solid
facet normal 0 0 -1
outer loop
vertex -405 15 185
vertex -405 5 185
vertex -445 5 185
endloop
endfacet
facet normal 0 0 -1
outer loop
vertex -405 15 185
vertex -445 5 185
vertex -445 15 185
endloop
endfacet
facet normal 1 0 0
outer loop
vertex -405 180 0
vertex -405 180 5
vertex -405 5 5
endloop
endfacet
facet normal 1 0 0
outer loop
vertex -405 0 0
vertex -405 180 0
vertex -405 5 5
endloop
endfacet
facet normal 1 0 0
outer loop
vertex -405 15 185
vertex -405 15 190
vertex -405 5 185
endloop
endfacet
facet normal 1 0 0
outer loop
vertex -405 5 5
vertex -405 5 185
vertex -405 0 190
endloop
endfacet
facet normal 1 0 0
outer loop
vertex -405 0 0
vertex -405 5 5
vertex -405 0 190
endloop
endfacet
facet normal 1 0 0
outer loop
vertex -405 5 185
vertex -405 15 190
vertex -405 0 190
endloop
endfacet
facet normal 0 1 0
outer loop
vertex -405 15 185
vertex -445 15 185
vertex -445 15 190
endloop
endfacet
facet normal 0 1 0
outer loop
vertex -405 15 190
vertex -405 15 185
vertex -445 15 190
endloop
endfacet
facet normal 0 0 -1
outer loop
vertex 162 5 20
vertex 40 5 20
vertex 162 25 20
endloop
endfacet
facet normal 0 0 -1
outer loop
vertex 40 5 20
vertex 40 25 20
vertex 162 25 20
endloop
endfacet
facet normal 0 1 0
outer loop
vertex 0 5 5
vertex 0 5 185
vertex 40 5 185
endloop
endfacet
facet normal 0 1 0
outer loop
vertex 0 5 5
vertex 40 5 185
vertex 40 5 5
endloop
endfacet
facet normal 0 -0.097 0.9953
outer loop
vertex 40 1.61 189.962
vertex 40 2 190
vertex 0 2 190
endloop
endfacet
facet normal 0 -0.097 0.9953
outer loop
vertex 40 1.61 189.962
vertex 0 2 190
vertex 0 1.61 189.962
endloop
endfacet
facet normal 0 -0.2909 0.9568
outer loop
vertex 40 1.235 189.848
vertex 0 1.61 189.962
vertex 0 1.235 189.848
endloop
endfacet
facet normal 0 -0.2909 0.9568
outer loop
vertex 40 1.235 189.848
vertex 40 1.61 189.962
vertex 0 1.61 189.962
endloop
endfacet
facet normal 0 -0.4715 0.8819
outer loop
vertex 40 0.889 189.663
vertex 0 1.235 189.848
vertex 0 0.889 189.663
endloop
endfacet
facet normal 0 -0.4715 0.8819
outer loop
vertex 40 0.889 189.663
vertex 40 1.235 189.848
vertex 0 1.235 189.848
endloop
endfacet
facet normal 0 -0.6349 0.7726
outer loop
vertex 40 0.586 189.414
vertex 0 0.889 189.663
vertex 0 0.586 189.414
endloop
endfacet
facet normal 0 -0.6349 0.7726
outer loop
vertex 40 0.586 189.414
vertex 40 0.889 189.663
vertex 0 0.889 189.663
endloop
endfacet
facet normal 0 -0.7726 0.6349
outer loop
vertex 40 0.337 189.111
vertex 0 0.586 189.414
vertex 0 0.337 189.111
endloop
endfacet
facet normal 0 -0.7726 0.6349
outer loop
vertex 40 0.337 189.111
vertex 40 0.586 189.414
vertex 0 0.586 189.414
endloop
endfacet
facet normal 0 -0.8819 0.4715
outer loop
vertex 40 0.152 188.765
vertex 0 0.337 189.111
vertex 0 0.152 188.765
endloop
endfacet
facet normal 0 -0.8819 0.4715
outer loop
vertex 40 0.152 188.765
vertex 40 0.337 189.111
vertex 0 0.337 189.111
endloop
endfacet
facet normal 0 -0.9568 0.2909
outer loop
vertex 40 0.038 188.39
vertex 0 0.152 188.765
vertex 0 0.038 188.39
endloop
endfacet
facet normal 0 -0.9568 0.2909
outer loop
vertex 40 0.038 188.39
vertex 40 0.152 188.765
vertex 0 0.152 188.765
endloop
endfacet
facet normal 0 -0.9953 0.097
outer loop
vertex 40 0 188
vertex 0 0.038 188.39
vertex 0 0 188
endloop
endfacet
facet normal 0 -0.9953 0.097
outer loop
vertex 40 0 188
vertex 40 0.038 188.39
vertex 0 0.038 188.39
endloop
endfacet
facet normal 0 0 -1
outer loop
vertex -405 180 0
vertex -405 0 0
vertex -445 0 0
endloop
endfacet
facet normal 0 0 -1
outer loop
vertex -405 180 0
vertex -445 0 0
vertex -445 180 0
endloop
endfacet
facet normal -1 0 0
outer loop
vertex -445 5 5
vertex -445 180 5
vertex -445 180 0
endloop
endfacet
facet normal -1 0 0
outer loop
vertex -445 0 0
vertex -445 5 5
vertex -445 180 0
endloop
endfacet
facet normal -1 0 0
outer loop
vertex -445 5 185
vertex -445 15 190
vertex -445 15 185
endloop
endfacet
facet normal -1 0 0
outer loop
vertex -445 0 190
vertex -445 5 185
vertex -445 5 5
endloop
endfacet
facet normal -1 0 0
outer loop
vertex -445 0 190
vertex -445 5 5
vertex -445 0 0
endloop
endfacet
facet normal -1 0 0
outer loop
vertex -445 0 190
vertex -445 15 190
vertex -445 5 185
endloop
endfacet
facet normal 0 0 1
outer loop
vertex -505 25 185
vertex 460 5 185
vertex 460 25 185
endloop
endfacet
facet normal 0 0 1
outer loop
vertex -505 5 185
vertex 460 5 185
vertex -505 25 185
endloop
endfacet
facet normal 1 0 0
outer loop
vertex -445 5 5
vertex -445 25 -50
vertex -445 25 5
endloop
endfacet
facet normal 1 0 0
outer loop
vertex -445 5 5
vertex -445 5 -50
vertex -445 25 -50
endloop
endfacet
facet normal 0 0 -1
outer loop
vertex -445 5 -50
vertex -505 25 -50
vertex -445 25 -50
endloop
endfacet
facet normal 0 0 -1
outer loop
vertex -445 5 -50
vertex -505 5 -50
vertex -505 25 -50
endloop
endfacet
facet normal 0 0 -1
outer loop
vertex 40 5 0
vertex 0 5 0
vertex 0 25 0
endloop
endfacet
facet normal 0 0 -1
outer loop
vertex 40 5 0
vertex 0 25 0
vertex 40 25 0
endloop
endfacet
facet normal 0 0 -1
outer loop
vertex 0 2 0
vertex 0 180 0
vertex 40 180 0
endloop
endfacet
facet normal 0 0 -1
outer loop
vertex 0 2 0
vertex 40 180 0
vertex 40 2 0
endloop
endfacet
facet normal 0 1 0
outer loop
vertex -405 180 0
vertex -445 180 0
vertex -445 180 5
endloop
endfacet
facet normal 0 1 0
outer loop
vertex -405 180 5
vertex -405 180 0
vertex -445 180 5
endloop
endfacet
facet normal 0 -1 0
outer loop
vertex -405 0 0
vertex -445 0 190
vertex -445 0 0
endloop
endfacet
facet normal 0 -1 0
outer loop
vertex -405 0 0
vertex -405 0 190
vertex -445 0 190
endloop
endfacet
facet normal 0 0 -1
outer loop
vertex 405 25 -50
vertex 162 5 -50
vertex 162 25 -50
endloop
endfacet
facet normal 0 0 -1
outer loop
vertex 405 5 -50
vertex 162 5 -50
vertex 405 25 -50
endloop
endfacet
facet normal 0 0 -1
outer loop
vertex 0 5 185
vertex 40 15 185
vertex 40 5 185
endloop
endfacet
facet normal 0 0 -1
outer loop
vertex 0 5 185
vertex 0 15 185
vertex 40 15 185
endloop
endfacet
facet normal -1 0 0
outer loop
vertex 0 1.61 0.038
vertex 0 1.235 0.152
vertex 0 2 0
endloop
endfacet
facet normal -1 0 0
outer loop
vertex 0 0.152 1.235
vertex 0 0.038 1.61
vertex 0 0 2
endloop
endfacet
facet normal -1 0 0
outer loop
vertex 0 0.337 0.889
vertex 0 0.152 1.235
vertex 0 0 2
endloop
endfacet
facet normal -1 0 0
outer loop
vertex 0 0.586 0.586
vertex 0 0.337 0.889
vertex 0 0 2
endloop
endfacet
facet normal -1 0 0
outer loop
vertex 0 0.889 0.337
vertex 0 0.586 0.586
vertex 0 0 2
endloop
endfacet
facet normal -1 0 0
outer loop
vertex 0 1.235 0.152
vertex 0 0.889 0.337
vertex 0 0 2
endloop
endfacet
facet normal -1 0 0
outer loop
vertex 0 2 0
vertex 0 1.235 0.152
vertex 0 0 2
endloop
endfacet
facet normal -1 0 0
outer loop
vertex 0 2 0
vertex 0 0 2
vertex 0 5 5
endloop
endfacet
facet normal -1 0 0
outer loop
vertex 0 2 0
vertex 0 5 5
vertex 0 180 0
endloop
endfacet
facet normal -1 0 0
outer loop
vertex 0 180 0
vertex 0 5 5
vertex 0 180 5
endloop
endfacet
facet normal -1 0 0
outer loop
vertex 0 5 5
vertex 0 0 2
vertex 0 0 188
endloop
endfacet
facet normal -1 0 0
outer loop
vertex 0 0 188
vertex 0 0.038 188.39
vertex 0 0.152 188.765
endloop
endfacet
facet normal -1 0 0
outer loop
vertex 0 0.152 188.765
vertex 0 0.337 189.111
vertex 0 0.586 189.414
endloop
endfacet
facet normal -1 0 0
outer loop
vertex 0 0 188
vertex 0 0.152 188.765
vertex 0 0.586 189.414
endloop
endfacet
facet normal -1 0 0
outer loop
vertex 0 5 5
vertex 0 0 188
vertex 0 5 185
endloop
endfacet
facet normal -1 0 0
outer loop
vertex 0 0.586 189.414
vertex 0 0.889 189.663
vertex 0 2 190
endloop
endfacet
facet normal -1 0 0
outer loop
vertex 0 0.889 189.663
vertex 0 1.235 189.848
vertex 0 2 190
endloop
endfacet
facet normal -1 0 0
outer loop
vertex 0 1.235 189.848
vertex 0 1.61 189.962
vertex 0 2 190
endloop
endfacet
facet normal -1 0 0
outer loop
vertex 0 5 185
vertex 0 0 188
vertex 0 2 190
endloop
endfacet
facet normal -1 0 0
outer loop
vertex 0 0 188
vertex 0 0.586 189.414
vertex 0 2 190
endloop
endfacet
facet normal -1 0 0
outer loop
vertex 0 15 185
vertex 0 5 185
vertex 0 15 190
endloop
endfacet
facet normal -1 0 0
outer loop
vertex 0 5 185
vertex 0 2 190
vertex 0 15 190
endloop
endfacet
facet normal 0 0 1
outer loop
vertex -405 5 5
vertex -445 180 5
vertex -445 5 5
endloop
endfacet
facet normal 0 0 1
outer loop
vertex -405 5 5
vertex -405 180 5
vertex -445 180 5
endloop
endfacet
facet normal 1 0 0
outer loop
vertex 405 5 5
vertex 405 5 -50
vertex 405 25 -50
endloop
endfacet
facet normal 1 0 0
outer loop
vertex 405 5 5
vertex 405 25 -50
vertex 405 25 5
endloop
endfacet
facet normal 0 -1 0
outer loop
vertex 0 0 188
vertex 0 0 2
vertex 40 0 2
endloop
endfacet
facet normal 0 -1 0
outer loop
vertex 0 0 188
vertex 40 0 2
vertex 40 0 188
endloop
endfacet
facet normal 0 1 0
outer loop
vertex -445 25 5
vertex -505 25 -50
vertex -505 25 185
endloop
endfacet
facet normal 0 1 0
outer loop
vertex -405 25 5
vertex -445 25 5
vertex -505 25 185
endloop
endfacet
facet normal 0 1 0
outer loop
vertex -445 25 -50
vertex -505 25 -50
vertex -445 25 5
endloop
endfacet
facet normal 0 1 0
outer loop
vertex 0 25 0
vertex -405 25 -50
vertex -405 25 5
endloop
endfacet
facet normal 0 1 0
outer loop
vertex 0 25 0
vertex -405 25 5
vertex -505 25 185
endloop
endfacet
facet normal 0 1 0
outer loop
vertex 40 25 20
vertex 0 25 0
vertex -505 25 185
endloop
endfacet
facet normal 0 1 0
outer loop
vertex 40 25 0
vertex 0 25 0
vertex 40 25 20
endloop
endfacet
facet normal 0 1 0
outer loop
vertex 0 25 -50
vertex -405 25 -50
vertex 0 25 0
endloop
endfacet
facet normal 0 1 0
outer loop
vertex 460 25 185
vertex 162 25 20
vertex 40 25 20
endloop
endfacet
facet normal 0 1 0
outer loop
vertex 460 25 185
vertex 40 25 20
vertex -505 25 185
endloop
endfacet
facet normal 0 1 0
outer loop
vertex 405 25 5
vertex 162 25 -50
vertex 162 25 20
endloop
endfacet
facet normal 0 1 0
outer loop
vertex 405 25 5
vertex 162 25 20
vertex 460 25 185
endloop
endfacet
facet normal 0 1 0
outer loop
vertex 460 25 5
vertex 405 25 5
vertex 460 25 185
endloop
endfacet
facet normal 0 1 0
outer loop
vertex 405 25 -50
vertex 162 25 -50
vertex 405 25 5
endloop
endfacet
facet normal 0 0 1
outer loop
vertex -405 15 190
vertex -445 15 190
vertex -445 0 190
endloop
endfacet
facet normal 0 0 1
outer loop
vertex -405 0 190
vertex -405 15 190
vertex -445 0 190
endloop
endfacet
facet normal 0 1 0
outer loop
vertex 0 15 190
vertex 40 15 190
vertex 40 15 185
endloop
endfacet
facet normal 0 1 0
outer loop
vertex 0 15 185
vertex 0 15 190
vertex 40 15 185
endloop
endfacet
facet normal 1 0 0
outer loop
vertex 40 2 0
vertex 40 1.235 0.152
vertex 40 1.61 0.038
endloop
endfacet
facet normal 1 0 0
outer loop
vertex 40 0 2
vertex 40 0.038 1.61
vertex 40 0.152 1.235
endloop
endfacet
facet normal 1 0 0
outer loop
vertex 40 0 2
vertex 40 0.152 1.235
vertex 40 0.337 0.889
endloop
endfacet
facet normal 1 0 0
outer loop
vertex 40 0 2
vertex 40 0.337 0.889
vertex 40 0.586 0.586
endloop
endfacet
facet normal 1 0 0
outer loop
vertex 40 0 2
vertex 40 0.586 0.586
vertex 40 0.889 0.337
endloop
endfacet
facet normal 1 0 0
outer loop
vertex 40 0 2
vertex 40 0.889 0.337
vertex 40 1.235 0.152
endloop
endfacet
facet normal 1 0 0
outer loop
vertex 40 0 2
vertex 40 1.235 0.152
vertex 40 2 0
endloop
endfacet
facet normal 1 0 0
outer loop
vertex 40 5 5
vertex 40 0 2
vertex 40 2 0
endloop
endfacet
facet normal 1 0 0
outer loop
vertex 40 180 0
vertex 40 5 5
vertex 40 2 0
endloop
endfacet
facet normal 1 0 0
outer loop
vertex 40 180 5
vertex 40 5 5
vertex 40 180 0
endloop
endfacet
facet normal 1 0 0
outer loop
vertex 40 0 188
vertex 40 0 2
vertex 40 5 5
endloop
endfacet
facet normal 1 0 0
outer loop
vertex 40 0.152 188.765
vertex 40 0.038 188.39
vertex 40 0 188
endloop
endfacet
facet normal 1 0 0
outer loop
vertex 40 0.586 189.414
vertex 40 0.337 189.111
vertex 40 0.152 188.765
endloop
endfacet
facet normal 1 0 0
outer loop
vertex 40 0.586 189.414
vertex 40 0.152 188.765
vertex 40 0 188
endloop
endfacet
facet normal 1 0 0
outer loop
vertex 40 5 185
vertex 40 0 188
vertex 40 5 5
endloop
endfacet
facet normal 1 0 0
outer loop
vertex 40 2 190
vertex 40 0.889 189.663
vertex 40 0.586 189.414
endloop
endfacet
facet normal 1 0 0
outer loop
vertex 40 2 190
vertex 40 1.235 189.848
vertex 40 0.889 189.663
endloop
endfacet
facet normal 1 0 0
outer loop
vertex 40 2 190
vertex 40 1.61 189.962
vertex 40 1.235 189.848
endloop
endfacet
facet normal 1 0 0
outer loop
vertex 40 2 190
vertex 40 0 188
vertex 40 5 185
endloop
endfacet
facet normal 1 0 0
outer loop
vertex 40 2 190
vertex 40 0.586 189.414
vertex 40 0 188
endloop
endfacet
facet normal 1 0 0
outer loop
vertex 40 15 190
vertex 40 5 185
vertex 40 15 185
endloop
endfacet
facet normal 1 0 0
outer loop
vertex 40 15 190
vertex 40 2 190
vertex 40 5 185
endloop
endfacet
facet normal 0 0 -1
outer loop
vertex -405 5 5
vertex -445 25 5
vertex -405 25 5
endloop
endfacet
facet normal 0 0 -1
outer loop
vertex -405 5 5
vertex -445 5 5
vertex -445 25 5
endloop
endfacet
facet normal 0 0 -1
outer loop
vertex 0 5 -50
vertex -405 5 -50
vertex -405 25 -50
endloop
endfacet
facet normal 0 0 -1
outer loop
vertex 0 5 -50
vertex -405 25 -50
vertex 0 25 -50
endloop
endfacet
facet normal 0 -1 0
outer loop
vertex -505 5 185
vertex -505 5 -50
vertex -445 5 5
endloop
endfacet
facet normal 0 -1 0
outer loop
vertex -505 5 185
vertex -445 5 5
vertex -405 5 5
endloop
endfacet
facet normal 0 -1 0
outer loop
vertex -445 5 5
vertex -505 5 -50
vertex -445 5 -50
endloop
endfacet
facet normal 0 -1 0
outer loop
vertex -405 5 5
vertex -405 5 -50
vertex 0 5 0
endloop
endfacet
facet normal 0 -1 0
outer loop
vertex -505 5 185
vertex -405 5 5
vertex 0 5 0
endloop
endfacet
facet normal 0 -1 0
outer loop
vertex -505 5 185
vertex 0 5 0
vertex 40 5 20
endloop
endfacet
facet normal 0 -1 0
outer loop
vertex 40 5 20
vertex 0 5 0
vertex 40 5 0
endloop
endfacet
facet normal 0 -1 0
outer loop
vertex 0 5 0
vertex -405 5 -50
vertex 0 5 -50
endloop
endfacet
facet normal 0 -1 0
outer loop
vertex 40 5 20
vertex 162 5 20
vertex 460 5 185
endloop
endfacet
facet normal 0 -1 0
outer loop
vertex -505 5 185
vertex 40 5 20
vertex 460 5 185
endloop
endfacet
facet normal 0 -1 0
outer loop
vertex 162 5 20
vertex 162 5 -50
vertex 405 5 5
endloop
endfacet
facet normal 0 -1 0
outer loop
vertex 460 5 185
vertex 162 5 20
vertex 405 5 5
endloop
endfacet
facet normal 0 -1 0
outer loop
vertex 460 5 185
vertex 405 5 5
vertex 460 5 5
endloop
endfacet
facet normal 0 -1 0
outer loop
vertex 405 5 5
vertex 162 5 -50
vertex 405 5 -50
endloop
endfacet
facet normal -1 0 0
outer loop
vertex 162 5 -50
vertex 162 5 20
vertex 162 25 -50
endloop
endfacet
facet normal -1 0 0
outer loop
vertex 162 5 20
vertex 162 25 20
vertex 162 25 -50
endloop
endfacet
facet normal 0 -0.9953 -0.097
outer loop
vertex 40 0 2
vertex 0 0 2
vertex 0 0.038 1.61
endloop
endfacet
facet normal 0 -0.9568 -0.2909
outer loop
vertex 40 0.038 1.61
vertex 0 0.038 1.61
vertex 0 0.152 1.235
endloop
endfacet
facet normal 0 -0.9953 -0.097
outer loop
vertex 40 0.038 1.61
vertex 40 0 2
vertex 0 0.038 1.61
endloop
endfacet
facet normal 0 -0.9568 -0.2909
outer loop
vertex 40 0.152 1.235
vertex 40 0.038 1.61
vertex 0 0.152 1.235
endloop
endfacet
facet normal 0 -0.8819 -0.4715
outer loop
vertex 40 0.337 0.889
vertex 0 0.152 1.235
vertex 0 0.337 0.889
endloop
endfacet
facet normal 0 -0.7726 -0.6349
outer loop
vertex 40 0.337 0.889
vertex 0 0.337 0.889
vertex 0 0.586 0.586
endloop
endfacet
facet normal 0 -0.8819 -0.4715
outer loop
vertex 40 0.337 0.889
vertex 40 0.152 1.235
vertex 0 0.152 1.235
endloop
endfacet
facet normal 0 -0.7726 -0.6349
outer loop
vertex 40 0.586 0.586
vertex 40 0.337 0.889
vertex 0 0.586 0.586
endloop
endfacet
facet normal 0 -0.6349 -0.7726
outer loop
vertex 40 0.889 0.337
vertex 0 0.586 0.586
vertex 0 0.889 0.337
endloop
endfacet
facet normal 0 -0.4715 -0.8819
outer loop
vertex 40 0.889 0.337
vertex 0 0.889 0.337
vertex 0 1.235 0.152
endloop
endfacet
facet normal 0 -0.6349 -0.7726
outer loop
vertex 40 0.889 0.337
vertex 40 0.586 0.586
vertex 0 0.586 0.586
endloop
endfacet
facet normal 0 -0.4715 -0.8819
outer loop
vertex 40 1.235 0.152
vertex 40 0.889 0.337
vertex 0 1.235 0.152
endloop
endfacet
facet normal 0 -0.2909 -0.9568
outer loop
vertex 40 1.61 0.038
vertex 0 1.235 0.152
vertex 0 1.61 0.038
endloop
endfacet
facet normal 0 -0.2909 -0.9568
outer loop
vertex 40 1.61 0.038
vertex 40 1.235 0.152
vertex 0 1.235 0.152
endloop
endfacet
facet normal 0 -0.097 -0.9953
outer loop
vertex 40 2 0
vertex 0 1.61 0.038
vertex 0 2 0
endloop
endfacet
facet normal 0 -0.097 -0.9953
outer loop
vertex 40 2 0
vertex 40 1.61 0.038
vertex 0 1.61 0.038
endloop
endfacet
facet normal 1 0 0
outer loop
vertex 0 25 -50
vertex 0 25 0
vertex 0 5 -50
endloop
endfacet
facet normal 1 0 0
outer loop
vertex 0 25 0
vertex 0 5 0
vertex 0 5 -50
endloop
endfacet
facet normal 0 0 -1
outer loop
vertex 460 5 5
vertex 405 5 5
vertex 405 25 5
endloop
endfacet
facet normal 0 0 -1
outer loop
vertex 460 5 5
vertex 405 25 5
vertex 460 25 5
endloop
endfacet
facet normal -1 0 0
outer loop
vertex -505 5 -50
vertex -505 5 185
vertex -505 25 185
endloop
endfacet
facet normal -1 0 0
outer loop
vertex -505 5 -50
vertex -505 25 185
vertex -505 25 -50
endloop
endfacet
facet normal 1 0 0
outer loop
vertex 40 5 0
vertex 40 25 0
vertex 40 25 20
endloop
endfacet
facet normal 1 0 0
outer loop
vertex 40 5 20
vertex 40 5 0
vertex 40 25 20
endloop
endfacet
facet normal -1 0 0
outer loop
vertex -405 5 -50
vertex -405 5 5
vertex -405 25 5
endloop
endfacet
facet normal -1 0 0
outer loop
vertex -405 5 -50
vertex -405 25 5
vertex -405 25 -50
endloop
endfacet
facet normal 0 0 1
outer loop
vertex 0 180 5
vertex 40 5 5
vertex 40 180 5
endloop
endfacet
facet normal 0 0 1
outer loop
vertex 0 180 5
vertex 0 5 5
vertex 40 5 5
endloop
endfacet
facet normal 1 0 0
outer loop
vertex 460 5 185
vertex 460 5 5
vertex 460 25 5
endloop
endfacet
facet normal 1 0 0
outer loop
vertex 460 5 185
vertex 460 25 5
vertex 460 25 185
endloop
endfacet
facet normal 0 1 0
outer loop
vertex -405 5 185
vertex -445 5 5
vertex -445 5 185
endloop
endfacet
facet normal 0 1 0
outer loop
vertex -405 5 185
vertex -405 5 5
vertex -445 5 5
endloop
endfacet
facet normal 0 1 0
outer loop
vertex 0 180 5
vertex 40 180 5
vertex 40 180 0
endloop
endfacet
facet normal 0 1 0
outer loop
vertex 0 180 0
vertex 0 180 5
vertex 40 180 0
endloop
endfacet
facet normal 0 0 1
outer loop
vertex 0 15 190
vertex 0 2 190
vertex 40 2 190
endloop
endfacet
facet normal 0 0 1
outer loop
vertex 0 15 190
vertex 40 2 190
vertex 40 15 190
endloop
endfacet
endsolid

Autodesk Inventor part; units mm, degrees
ref_plane "YZ Plane" through (0, 0, 0) normal (1, 0, 0) x (0, 1, 0)
ref_plane "XZ Plane" through (0, 0, 0) normal (0, 1, 0) x (-1, 0, 0)
sketch "Sketch1" plane through (0, 0, 0) normal (1, 0, 0) x (0, 1, 0)
  line L0 (0, 0) -> (0, 190)
  line L1 (0, 190) -> (15, 190)
  line L2 (15, 190) -> (15, 185)
  line L3 (15, 185) -> (5, 185)
  line L4 (5, 185) -> (5, 5)
  line L5 (5, 5) -> (180, 5)
  line L6 (180, 5) -> (180, 0)
  line L7 (180, 0) -> (0, 0)
  line L8 (5, 95) -> (0, 95) construction
  dimension "d0" = 190
  dimension "d1" = 15
  dimension "d2" = 180
  dimension "d3" = 5
extrude "Extrusion1" add sketch "Sketch1" along normal blind 40
fillet "Fillet1" radius 2 2 edges at (20, 0, 190) (20, 0, 0)
sketch "Sketch2" plane through (0, 5, 185) normal (0, 1, 0) x (1, 0, 0)
  line L0 (460, 0) -> (-505, 0)
  line L1 (-505, 0) -> (-505, 235)
  line L2 (-505, 235) -> (460, 235)
  line L3 (460, 235) -> (460, 0)
  line L4 (0, 0) -> (40, 0) projected
  line L5 (40, 180) -> (40, 0) projected
  line L6 (-405, 235) -> (-405, 0) construction
  line L7 (0, 180) -> (0, 0) construction
  line L8 (-445, 235) -> (-445, 0) construction
  line L9 (-445, 180) -> (-405, 180)
  line L10 (-445, 235) -> (-445, 180)
  line L11 (-405, 180) -> (-405, 235)
  line L12 (0, 185) -> (40, 185)
  line L13 (0, 180) -> (40, 180) projected
  line L14 (0, 180) -> (40, 180)
  line L15 (40, 180) -> (40, 235)
  line L16 (0, 180) -> (0, 235)
  line L17 (405, 235) -> (405, 180)
  line L18 (405, 180) -> (460, 180)
  dimension "d8" = 420
  dimension "d9" = 405
  dimension "d10" = 40
  dimension "d11" = 60
  dimension "d14" = 50
  dimension "d15" = 55
  dimension "d16" = 55
extrude "Extrusion2" add sketch "Sketch2" along normal blind 20 separate body contours L0 L5 L15 L2 L17 L18 L3 | L0 L1 L2 L10 L9 L11 L16 L13 L5 | L13 L16 L12 L15
ref_plane "Work Plane1" through (-202.5, 5, -50) normal (-1, 0, 0) x (0, 0, 1)
mirror "Mirror1" about plane through (-202.5, 5, -50) normal (-1, 0, 0) of "Extrusion1" bodies 1
sketch "Sketch3" plane through (-227.623, 25, 187.9845) normal (0, 1, 0) x (1, 0, 0)
  line L0 (267.623, 182.9845) -> (267.623, 2.9845) projected
  line L1 (267.623, 182.9845) -> (267.623, 167.9845)
  line L2 (267.623, 167.9845) -> (389.623, 167.9845)
  line L3 (389.623, 167.9845) -> (389.623, 237.9845)
  line L4 (632.623, 237.9845) -> (267.623, 237.9845) projected
  line L5 (267.623, 237.9845) -> (267.623, 182.9845)
  line L6 (267.623, 237.9845) -> (389.623, 237.9845)
  dimension "d22" = 15
  dimension "d23" = 122
extrude "Extrusion3" cut sketch "Sketch3" against normal blind 20 bodies 2
properties part number "BottomShelf"
